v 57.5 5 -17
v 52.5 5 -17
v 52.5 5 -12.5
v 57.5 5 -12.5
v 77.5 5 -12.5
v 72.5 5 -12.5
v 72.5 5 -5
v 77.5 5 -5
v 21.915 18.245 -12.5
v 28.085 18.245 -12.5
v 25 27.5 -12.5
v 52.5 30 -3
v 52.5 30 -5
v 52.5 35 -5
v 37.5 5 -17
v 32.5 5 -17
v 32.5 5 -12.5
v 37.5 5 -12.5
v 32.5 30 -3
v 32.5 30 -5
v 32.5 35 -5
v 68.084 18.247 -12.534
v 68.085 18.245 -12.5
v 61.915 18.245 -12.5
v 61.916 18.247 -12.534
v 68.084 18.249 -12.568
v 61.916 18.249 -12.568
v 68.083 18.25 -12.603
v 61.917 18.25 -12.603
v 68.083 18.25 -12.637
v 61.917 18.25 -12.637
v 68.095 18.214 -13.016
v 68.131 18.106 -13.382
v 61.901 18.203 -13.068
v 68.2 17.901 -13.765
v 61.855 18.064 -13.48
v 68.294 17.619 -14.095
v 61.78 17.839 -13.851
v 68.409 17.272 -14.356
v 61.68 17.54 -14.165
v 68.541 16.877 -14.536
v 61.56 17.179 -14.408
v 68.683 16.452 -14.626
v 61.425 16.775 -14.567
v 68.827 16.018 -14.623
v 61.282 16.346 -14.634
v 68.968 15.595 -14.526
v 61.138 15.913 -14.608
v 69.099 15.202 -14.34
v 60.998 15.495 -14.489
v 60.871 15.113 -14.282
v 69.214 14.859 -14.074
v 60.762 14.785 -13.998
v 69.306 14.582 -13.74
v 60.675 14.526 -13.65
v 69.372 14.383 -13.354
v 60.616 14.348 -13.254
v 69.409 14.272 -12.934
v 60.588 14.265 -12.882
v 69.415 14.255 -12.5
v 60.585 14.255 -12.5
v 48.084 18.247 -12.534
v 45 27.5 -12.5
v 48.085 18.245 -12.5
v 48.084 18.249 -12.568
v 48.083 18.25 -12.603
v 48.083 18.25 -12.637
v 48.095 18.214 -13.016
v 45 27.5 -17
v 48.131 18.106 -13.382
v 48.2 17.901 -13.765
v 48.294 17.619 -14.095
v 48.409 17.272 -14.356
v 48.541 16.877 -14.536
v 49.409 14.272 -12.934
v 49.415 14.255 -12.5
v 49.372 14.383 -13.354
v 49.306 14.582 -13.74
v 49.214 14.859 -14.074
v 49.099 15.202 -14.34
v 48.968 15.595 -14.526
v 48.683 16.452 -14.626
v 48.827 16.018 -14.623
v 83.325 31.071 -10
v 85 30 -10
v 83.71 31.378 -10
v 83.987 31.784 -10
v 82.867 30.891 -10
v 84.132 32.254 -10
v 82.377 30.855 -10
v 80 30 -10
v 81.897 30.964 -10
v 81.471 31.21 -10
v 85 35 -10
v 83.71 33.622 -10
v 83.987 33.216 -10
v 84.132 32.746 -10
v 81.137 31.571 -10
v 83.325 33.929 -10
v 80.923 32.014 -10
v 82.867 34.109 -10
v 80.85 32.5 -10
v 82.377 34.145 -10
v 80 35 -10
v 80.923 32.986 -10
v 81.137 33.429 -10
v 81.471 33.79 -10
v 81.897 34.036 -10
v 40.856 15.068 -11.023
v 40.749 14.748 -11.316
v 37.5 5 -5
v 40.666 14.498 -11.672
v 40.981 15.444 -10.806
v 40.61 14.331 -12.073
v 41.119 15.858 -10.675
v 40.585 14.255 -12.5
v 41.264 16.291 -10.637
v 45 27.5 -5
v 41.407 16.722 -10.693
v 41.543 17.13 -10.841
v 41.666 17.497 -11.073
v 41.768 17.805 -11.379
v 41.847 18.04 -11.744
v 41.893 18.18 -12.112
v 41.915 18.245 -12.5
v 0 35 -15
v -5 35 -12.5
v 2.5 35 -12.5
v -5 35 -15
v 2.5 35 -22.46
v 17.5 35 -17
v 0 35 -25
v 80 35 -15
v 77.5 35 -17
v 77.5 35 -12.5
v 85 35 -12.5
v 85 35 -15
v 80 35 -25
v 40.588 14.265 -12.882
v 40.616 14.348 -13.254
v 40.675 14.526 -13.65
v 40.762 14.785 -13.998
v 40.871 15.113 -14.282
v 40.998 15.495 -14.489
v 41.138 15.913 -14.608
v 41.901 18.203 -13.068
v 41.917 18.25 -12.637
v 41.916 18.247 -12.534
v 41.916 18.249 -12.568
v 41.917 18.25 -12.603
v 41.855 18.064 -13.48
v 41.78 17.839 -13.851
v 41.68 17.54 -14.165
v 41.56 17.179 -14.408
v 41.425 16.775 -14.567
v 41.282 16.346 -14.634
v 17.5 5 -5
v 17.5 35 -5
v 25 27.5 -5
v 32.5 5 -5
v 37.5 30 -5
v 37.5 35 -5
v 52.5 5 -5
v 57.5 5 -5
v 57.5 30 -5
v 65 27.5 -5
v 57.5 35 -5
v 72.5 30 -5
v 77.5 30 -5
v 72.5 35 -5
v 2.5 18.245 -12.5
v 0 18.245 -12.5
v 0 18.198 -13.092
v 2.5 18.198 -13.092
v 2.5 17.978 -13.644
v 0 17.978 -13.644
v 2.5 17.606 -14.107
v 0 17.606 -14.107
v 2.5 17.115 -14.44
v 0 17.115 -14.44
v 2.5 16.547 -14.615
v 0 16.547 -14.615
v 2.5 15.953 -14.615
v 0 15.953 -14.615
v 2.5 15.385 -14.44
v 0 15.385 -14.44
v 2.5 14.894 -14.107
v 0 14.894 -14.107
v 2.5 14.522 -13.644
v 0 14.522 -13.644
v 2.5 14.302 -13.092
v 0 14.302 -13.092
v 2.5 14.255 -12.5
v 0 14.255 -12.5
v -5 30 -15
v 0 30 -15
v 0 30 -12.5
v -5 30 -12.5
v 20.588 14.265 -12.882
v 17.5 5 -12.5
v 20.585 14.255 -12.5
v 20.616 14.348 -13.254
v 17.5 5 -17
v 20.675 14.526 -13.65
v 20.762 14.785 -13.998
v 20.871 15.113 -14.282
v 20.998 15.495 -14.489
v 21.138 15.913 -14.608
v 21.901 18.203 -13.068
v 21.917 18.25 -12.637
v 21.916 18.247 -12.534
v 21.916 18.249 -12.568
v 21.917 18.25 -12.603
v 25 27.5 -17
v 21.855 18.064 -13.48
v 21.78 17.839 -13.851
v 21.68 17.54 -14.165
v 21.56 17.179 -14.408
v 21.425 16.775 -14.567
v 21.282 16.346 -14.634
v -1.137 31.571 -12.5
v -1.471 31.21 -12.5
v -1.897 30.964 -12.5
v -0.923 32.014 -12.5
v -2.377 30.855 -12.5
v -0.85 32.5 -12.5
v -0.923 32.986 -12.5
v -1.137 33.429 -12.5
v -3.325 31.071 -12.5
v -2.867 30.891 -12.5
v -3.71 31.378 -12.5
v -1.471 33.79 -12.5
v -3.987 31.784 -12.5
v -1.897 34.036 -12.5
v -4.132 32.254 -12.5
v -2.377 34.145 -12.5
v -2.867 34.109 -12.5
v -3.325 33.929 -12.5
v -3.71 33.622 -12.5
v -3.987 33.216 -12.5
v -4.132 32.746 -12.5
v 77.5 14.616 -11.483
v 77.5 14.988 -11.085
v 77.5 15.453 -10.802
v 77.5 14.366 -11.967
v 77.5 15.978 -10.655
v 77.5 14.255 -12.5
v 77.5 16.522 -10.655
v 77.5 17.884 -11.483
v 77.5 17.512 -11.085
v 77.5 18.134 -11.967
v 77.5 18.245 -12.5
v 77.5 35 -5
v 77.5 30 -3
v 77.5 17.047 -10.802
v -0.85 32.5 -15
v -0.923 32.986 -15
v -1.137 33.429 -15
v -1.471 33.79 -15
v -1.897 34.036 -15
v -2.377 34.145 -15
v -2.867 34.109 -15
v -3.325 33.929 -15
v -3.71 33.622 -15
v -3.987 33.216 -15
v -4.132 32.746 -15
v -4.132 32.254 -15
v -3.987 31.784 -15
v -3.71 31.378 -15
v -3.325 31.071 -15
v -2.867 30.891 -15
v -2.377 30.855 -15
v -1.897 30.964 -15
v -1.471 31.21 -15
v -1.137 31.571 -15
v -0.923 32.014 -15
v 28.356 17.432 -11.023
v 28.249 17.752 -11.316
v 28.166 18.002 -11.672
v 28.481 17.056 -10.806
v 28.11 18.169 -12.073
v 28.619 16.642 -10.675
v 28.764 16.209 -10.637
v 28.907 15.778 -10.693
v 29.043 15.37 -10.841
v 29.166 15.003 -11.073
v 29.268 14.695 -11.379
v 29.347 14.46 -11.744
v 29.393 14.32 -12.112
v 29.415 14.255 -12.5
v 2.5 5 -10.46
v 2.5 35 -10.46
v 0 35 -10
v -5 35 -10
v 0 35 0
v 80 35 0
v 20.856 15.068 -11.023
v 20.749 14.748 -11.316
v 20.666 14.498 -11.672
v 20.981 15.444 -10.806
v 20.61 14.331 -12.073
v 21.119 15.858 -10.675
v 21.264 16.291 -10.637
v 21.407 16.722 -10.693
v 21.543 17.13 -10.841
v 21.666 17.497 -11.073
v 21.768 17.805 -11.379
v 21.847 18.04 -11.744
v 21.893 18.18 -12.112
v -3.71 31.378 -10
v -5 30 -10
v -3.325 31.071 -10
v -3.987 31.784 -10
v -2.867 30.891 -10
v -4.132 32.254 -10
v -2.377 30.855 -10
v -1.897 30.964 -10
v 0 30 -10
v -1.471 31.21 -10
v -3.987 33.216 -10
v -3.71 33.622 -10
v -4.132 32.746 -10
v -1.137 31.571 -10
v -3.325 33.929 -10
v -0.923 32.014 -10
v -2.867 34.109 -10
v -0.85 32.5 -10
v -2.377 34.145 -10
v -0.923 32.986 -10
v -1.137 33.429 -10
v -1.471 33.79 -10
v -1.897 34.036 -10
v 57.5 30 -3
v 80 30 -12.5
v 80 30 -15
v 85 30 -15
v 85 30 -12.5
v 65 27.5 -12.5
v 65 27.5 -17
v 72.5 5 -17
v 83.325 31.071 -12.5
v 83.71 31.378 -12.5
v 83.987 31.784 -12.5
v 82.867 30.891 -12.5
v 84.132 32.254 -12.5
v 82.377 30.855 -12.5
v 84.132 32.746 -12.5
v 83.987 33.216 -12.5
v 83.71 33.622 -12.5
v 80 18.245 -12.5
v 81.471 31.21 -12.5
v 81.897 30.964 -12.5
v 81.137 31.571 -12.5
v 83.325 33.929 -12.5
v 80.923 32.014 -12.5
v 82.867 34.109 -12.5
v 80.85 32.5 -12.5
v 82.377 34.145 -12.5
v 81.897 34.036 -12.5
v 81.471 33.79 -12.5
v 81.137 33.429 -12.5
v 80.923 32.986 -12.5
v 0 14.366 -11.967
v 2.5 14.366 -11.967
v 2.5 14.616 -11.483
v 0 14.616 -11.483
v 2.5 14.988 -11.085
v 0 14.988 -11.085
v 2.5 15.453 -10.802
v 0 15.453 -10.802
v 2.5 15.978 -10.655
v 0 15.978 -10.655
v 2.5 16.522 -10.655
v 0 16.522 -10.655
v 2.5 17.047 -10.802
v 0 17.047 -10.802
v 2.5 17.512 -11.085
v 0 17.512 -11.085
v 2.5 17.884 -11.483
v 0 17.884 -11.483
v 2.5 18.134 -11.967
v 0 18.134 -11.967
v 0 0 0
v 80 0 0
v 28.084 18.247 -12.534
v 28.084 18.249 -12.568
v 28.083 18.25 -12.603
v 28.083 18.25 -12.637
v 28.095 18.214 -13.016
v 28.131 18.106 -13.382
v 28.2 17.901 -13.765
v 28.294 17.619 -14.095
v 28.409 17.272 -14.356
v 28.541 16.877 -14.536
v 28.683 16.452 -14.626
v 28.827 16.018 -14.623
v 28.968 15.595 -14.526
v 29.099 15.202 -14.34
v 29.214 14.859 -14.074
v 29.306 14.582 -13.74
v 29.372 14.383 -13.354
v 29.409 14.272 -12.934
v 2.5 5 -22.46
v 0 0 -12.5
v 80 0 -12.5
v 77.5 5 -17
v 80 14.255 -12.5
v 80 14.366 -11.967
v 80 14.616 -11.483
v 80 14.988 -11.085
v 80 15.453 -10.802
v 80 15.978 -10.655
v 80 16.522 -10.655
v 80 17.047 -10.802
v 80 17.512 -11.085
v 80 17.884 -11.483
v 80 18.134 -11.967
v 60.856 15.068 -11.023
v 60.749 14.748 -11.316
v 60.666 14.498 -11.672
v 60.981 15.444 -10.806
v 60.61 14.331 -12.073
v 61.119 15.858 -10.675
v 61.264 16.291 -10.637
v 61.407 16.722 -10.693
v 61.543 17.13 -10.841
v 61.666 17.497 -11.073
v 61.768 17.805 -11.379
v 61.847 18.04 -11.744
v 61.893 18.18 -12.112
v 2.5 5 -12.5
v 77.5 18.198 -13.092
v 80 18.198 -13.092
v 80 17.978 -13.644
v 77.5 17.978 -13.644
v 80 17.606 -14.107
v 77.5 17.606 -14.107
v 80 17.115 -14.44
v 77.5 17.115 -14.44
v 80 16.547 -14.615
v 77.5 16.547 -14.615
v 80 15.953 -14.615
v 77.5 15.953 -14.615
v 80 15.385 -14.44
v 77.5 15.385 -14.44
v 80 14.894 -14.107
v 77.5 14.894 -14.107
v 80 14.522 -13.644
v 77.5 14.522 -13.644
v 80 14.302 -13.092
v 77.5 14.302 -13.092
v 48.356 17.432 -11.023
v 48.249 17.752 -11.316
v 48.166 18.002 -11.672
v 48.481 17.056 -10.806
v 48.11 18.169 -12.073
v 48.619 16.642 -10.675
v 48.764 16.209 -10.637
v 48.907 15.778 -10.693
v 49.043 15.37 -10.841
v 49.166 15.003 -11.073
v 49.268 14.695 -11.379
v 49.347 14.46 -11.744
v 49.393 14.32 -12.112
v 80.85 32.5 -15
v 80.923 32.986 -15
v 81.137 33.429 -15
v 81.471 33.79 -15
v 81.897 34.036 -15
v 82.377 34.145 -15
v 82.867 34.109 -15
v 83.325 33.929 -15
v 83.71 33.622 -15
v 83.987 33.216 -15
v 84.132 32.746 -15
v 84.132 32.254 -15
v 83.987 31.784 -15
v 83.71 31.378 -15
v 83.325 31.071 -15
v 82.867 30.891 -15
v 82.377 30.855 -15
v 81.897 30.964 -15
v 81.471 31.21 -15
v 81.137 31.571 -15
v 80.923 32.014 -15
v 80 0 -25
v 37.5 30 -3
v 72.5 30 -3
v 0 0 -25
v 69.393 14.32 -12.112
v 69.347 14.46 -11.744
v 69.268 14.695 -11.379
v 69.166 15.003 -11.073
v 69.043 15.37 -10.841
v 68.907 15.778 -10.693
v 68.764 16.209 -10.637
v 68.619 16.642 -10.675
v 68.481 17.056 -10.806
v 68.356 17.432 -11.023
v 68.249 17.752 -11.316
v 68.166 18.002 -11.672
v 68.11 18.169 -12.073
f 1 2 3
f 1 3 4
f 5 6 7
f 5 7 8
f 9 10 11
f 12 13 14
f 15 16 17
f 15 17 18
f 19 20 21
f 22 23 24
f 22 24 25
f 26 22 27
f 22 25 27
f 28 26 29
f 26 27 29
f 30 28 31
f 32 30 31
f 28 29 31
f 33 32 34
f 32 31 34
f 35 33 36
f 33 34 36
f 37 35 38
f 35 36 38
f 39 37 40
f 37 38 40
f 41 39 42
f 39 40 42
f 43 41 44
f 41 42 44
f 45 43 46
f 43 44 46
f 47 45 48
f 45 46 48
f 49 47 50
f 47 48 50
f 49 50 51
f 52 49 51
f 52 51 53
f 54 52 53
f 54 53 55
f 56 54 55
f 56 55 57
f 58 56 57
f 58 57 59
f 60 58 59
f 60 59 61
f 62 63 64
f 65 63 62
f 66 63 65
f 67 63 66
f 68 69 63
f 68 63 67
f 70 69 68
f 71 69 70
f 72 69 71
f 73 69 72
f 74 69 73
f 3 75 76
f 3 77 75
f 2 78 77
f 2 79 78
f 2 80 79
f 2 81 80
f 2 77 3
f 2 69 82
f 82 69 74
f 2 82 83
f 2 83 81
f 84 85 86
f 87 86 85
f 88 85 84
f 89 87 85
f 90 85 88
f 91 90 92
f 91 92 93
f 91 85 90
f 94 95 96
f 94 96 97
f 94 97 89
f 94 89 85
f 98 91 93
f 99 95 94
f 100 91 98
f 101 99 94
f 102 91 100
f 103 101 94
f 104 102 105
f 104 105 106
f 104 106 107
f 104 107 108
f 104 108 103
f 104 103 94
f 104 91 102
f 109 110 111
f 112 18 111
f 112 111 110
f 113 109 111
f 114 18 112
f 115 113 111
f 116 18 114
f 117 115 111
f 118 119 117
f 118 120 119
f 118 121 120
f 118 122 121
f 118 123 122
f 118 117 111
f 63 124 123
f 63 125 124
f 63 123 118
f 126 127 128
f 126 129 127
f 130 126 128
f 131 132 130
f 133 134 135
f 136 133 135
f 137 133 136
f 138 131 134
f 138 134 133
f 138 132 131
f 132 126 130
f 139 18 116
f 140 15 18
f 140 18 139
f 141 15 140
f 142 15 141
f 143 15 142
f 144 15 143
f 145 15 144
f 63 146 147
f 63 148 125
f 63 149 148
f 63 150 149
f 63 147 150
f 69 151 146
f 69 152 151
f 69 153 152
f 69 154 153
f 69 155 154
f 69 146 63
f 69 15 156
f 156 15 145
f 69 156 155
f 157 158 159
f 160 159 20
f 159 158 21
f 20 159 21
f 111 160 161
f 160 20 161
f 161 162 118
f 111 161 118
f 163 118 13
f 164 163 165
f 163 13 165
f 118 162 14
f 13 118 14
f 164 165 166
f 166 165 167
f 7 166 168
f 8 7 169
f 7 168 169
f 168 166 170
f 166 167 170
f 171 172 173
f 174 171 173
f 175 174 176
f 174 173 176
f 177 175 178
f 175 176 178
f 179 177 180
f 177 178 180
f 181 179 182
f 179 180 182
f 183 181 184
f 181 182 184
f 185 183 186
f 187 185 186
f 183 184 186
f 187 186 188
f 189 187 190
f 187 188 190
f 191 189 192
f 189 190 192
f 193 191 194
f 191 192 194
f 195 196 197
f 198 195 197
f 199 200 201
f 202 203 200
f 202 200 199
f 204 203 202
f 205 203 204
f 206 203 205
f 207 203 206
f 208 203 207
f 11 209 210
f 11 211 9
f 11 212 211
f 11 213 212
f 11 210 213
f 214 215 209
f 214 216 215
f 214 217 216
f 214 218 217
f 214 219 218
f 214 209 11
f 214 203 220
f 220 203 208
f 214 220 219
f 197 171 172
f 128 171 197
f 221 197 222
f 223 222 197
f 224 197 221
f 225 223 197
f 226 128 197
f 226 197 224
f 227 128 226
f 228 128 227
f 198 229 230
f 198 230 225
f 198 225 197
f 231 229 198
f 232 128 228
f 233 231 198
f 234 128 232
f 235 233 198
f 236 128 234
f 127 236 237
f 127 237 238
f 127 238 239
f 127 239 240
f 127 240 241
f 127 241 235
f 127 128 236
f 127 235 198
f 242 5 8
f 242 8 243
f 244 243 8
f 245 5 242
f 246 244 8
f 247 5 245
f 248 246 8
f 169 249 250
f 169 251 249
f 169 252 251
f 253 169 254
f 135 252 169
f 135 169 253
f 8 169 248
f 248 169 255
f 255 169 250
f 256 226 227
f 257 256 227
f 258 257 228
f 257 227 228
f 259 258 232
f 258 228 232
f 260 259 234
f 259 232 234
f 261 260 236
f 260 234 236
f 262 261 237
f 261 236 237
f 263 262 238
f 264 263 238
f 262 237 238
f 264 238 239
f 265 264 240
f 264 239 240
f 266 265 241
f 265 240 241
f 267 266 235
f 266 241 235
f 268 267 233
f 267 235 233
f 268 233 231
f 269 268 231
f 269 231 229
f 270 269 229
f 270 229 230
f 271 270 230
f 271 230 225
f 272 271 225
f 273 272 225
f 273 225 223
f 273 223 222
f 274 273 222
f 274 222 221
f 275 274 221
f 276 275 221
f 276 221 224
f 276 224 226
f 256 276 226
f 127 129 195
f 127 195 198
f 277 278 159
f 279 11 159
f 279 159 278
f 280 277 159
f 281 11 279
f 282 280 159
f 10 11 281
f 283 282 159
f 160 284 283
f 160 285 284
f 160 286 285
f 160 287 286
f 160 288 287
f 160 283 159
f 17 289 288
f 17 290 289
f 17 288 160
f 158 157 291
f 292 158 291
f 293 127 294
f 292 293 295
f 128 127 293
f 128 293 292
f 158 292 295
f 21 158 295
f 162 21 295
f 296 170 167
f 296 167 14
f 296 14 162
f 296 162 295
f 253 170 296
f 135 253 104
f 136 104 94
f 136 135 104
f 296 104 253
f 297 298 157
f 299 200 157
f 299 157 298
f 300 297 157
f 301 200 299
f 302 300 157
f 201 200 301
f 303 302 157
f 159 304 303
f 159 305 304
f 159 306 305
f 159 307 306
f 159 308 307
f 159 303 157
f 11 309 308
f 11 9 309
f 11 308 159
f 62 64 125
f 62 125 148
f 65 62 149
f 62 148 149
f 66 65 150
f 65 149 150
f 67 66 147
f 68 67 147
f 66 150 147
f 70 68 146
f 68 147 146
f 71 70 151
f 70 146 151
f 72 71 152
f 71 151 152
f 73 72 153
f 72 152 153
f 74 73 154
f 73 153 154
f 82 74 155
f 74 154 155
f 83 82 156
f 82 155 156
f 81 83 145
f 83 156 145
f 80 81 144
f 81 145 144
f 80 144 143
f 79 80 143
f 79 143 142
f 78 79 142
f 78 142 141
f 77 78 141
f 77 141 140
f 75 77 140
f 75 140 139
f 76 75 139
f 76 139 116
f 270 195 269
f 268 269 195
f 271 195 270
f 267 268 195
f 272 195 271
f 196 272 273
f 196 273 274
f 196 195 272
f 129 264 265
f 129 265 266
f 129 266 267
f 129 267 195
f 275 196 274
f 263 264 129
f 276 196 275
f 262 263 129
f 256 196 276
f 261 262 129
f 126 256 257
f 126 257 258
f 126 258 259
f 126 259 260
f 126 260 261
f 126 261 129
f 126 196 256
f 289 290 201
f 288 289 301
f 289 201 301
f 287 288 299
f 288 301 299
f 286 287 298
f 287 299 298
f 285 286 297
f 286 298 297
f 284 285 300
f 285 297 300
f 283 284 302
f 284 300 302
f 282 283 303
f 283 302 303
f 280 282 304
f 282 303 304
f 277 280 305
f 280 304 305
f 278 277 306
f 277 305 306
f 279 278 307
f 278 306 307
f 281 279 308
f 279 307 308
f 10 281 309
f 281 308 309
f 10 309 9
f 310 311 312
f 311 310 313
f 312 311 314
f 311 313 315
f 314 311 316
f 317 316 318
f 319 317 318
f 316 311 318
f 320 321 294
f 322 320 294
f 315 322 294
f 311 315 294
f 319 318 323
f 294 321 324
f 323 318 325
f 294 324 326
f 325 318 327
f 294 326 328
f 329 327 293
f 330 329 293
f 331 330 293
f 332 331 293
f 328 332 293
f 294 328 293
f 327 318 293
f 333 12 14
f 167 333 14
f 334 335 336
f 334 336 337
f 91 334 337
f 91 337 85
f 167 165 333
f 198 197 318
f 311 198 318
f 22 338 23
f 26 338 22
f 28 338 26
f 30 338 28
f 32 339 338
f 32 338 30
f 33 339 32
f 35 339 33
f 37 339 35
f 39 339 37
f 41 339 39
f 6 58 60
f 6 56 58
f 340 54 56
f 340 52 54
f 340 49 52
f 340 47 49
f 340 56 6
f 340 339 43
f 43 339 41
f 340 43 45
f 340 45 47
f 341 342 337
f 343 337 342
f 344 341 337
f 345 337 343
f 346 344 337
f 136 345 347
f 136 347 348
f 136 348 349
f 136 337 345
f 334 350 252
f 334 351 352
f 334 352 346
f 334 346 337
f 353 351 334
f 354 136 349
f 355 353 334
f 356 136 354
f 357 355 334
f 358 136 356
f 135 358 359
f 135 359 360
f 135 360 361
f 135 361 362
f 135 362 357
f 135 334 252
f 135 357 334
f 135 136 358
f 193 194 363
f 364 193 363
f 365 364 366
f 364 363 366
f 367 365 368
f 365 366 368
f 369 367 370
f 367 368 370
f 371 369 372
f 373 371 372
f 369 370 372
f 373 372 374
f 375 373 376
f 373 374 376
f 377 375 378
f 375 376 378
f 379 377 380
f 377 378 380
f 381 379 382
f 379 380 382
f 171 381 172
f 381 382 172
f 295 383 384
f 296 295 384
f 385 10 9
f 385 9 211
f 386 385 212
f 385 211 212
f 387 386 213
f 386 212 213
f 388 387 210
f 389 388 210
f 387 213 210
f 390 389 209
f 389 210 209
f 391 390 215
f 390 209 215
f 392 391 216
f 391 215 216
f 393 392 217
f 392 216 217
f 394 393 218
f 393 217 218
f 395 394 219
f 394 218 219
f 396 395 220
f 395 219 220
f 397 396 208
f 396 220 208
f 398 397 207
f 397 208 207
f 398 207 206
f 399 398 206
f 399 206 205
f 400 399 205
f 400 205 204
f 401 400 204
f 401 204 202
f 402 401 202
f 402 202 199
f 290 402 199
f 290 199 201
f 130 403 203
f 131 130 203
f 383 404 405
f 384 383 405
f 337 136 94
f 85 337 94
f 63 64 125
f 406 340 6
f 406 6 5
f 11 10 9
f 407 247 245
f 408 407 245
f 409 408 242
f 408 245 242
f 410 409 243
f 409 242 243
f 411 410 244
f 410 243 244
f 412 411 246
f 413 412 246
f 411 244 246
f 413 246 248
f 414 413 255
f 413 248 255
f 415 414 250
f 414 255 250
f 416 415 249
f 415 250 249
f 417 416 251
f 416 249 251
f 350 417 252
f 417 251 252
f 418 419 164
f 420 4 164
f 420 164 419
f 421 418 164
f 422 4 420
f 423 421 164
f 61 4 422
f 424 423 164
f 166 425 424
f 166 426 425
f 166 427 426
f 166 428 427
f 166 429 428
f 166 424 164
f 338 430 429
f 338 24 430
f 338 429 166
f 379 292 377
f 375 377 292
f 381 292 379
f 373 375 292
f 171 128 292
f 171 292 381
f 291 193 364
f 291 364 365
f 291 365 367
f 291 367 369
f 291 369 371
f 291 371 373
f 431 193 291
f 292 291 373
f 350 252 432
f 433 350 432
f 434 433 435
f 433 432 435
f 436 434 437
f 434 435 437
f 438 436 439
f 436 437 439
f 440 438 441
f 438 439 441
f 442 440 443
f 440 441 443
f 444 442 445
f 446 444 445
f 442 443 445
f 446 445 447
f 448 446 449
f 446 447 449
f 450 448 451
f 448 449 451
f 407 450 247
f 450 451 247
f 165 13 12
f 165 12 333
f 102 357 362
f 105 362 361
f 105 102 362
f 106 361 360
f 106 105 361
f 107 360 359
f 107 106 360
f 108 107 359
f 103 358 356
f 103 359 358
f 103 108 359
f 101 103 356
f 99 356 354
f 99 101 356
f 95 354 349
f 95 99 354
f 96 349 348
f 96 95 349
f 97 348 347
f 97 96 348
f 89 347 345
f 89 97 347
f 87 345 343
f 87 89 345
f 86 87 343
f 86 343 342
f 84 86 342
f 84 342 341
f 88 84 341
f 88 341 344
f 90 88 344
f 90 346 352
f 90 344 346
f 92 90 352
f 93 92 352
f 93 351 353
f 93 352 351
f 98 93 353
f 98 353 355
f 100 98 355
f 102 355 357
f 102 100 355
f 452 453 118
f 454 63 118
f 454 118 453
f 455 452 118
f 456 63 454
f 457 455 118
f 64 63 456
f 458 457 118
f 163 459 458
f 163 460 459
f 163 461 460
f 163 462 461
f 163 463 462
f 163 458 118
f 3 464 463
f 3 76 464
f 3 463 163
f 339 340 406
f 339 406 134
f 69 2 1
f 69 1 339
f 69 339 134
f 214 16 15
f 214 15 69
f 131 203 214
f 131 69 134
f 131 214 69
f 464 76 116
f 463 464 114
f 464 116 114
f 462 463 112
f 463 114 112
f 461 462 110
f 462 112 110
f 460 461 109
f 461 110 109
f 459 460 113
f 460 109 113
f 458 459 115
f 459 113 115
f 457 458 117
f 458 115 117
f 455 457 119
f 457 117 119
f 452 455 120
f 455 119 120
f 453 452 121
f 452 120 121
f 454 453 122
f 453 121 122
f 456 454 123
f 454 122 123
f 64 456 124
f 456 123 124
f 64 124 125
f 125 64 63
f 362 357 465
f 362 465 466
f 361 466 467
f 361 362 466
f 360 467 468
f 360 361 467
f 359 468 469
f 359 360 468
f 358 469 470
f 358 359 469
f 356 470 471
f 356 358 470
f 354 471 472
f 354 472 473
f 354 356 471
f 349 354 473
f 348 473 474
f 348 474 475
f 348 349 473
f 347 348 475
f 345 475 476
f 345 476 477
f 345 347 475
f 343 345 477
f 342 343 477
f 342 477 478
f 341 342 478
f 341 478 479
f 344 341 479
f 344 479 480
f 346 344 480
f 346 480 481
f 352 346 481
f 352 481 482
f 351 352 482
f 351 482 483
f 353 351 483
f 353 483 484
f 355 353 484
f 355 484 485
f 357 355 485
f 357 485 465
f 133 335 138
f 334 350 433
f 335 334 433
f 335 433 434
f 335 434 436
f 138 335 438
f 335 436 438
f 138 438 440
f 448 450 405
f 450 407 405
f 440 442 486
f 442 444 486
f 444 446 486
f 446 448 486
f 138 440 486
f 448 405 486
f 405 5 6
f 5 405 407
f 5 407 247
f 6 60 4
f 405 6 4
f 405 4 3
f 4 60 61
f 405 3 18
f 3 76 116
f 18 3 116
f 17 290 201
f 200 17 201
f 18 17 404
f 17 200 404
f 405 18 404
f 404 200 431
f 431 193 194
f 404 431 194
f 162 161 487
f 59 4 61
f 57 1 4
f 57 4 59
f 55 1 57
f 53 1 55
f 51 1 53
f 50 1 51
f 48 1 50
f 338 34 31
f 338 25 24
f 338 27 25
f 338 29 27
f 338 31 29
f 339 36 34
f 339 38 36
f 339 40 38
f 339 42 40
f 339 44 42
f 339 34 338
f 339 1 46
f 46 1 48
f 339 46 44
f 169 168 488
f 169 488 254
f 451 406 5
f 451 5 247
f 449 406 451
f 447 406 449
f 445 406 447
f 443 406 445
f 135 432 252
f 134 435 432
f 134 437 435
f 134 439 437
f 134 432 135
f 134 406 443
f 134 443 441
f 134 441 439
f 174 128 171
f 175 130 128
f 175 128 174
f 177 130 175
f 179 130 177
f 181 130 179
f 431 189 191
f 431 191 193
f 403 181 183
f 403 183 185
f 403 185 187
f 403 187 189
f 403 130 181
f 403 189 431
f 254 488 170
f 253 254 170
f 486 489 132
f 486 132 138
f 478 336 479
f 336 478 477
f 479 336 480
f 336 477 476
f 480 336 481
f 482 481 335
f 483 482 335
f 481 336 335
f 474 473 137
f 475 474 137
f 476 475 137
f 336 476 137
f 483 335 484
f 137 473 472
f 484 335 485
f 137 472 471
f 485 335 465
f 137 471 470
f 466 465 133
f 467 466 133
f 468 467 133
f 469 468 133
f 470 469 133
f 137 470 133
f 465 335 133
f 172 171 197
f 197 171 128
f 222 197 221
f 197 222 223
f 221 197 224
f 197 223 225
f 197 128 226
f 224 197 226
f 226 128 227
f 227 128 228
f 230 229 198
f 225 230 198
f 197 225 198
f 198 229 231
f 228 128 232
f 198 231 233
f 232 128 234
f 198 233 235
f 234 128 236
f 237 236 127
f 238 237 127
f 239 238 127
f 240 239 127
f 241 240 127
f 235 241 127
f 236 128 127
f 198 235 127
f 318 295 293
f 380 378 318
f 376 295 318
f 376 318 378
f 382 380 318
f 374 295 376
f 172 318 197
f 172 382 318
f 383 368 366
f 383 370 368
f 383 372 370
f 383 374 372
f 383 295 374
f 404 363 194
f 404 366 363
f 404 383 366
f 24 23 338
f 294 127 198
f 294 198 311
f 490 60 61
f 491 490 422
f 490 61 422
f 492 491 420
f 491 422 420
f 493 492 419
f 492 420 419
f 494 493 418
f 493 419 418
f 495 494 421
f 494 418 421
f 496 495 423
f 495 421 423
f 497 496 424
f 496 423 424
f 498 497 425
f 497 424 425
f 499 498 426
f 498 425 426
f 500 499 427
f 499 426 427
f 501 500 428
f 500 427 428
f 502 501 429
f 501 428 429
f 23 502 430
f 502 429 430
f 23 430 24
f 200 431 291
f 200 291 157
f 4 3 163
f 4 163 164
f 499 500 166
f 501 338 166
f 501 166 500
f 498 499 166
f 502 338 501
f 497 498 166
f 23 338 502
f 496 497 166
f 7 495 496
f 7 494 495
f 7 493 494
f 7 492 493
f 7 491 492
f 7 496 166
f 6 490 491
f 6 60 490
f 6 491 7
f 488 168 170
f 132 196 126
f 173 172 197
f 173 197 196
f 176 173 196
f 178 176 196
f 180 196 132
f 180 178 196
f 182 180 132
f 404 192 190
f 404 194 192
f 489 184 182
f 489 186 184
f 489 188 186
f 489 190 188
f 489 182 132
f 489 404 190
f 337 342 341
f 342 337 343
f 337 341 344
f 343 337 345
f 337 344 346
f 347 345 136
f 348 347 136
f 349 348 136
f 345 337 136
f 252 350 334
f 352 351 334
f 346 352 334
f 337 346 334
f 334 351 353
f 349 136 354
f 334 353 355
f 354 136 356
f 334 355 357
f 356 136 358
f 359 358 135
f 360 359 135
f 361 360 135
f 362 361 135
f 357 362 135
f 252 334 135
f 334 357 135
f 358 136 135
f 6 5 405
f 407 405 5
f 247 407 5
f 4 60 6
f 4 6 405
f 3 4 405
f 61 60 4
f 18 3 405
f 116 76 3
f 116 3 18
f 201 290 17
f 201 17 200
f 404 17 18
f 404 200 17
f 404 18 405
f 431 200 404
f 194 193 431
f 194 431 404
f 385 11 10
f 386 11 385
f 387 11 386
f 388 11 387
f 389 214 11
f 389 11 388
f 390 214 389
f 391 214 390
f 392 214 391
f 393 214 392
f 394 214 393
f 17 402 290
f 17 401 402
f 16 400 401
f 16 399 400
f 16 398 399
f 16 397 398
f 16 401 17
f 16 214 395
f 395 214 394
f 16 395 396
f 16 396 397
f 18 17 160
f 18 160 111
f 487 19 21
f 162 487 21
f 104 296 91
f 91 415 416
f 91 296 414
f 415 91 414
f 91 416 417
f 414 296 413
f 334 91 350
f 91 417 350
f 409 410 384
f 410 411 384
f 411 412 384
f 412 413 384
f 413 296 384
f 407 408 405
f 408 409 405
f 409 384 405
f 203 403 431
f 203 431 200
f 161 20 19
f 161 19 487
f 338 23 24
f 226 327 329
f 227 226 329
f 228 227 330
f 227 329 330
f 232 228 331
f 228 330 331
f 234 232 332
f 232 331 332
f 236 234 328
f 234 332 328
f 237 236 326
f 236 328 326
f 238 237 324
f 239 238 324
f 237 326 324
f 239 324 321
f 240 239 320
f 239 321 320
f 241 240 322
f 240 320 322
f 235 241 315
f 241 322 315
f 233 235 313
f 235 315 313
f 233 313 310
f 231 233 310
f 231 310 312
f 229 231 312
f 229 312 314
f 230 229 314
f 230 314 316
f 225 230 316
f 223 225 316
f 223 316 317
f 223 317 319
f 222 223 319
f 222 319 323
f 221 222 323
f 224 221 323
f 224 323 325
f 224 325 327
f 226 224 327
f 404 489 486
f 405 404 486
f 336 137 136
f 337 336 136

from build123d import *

# Parameters (mm, degrees)
SKETCH1_W           = 80
SKETCH1_H           = 25
BOSS_EXTRUDE1_DEPTH = 35
CAVITY1_START       = -22.459553514
CAVITY1_DEPTH       = 17.459553514
CAVITY1_START_2     = -17
CAVITY1_2_OUTLINE_W = 5
CAVITY1_2_OUTLINE_H = 5
CAVITY1_2_DEPTH     = 14
CAVITY1_START_3     = 17.5
CAVITY1_3_OUTLINE_W = 30
CAVITY1_3_OUTLINE_H = 5.459553514
CAVITY1_3_DEPTH     = 60
CAVITY1_START_4     = 5
CAVITY1_4_DEPTH     = 30
SKETCH2_W           = 5
SKETCH2_H           = 5
BOSS_EXTRUDE2_DEPTH = 5
SKETCH3_R           = 1.65
CUT_EXTRUDE1_DEPTH  = 5
CUT_EXTRUDE2_REACH  = 97.263
SKETCH4_R           = 2


with BuildPart() as part:
    # Sketch1 → Boss-Extrude1 (new body)
    with BuildSketch(Plane(origin=(0, 0, 0), x_dir=(1, 0, 0), z_dir=(0, 1, 0))):
        with Locations((40, 12.5)):
            Rectangle(SKETCH1_W, SKETCH1_H)
    extrude(amount=BOSS_EXTRUDE1_DEPTH)

    # Cavity1: read off the stored shape, not the designer's step
    # Cavity1 outline → Cavity1 (cut)
    with BuildSketch(Plane.XY.offset(CAVITY1_START)):
        Polygon((2.5, 5), (17.5, 5), (25, 27.5), (32.5, 5), (37.5, 5), (45, 27.5), (52.5, 5), (57.5, 5), (65, 27.5), (72.5, 5), (77.5, 5), (77.5, 30), (72.5, 30), (72.5, 35), (57.5, 35), (57.5, 30), (52.5, 30), (52.5, 35), (37.5, 35), (37.5, 30), (32.5, 30), (32.5, 35), (2.5, 35), align=None)
    extrude(amount=CAVITY1_DEPTH, mode=Mode.SUBTRACT)

    # Cavity1 2 outline → Cavity1 2 (cut)
    with BuildSketch(Plane.XY.offset(CAVITY1_START_2)):
        with Locations((35, 32.5)):
            Rectangle(CAVITY1_2_OUTLINE_W, CAVITY1_2_OUTLINE_H)
        with Locations((55, 32.5)):
            Rectangle(CAVITY1_2_OUTLINE_W, CAVITY1_2_OUTLINE_H)
        with Locations((75, 32.5)):
            Rectangle(CAVITY1_2_OUTLINE_W, CAVITY1_2_OUTLINE_H)
    extrude(amount=CAVITY1_2_DEPTH, mode=Mode.SUBTRACT)

    # Cavity1 3 outline → Cavity1 3 (add)
    with BuildSketch(Plane.YZ.offset(CAVITY1_START_3)):
        Polygon((35, -5), (35, -3), (30, -3), align=None)
        with Locations((20, -19.729776757)):
            Rectangle(CAVITY1_3_OUTLINE_W, CAVITY1_3_OUTLINE_H)
    extrude(amount=CAVITY1_3_DEPTH)

    # Cavity1 4 outline → Cavity1 4 (add)
    with BuildSketch(Plane(origin=(0, 0, 0), x_dir=(1, 0, 0), z_dir=(0, 1, 0)).offset(CAVITY1_START_4)):
        Polygon((17.5, 5), (2.5, 10.459553514), (2.5, 5), align=None)
        Polygon((17.5, 22.459553514), (2.5, 22.459553514), (17.5, 17), align=None)
    extrude(amount=CAVITY1_4_DEPTH)

    # Sketch2 → Boss-Extrude2 (add)
    with BuildSketch(Plane.ZY):
        with Locations((-12.5, 32.5)):
            Rectangle(SKETCH2_W, SKETCH2_H)
    boss_extrude2 = extrude(amount=BOSS_EXTRUDE2_DEPTH)

    # Sketch3 → Cut-Extrude1 (cut)
    with BuildSketch(Plane.XY.offset(-10)):
        with Locations((-2.5, 32.5)):
            Circle(SKETCH3_R)
    cut_extrude1 = extrude(amount=-CUT_EXTRUDE1_DEPTH, mode=Mode.SUBTRACT)

    # Mirror1: Boss-Extrude2, Cut-Extrude1 across plane
    add(boss_extrude2.mirror(Plane.ZY.offset(-40)))
    add(cut_extrude1.mirror(Plane.ZY.offset(-40)), mode=Mode.SUBTRACT)

    # Cut-Extrude2: up to this face of the body (flat: up to its plane)
    cut_extrude2_end = Plane(part.part.faces().sort_by_distance((80, 17.058823529, -12.5))[0])
    # Sketch4 → Cut-Extrude2 (cut, up to the picked face)
    with BuildSketch(Plane.ZY, mode=Mode.PRIVATE) as cut_extrude2_sk1:
        with Locations(Location((-12.636718447, 16.25, 0), (0, 0, 90))):
            Circle(SKETCH4_R)
    cut_extrude2_tool1 = split(extrude(cut_extrude2_sk1.sketch, amount=-CUT_EXTRUDE2_REACH, mode=Mode.PRIVATE), bisect_by=cut_extrude2_end, keep=Keep.BOTH, mode=Mode.PRIVATE)
    add(cut_extrude2_tool1.solids().sort_by(Axis((0, 16.25, -12.636718), (1, 0, 0)))[0], mode=Mode.SUBTRACT)


with BuildPart() as body_2:
    # Split1: the piece on the far side of the plane
    add(part.part)
    split(bisect_by=Plane(origin=(0, 0, -12.5), x_dir=(-1, 0, 0), z_dir=(0, 0, -1)), keep=Keep.BOTTOM)


with BuildPart() as part_1:
    add(part.part)

    # Split1
    split(bisect_by=Plane(origin=(0, 0, -12.5), x_dir=(-1, 0, 0), z_dir=(0, 0, -1)), keep=Keep.TOP)


solid = Compound([body_2.part, part_1.part])
